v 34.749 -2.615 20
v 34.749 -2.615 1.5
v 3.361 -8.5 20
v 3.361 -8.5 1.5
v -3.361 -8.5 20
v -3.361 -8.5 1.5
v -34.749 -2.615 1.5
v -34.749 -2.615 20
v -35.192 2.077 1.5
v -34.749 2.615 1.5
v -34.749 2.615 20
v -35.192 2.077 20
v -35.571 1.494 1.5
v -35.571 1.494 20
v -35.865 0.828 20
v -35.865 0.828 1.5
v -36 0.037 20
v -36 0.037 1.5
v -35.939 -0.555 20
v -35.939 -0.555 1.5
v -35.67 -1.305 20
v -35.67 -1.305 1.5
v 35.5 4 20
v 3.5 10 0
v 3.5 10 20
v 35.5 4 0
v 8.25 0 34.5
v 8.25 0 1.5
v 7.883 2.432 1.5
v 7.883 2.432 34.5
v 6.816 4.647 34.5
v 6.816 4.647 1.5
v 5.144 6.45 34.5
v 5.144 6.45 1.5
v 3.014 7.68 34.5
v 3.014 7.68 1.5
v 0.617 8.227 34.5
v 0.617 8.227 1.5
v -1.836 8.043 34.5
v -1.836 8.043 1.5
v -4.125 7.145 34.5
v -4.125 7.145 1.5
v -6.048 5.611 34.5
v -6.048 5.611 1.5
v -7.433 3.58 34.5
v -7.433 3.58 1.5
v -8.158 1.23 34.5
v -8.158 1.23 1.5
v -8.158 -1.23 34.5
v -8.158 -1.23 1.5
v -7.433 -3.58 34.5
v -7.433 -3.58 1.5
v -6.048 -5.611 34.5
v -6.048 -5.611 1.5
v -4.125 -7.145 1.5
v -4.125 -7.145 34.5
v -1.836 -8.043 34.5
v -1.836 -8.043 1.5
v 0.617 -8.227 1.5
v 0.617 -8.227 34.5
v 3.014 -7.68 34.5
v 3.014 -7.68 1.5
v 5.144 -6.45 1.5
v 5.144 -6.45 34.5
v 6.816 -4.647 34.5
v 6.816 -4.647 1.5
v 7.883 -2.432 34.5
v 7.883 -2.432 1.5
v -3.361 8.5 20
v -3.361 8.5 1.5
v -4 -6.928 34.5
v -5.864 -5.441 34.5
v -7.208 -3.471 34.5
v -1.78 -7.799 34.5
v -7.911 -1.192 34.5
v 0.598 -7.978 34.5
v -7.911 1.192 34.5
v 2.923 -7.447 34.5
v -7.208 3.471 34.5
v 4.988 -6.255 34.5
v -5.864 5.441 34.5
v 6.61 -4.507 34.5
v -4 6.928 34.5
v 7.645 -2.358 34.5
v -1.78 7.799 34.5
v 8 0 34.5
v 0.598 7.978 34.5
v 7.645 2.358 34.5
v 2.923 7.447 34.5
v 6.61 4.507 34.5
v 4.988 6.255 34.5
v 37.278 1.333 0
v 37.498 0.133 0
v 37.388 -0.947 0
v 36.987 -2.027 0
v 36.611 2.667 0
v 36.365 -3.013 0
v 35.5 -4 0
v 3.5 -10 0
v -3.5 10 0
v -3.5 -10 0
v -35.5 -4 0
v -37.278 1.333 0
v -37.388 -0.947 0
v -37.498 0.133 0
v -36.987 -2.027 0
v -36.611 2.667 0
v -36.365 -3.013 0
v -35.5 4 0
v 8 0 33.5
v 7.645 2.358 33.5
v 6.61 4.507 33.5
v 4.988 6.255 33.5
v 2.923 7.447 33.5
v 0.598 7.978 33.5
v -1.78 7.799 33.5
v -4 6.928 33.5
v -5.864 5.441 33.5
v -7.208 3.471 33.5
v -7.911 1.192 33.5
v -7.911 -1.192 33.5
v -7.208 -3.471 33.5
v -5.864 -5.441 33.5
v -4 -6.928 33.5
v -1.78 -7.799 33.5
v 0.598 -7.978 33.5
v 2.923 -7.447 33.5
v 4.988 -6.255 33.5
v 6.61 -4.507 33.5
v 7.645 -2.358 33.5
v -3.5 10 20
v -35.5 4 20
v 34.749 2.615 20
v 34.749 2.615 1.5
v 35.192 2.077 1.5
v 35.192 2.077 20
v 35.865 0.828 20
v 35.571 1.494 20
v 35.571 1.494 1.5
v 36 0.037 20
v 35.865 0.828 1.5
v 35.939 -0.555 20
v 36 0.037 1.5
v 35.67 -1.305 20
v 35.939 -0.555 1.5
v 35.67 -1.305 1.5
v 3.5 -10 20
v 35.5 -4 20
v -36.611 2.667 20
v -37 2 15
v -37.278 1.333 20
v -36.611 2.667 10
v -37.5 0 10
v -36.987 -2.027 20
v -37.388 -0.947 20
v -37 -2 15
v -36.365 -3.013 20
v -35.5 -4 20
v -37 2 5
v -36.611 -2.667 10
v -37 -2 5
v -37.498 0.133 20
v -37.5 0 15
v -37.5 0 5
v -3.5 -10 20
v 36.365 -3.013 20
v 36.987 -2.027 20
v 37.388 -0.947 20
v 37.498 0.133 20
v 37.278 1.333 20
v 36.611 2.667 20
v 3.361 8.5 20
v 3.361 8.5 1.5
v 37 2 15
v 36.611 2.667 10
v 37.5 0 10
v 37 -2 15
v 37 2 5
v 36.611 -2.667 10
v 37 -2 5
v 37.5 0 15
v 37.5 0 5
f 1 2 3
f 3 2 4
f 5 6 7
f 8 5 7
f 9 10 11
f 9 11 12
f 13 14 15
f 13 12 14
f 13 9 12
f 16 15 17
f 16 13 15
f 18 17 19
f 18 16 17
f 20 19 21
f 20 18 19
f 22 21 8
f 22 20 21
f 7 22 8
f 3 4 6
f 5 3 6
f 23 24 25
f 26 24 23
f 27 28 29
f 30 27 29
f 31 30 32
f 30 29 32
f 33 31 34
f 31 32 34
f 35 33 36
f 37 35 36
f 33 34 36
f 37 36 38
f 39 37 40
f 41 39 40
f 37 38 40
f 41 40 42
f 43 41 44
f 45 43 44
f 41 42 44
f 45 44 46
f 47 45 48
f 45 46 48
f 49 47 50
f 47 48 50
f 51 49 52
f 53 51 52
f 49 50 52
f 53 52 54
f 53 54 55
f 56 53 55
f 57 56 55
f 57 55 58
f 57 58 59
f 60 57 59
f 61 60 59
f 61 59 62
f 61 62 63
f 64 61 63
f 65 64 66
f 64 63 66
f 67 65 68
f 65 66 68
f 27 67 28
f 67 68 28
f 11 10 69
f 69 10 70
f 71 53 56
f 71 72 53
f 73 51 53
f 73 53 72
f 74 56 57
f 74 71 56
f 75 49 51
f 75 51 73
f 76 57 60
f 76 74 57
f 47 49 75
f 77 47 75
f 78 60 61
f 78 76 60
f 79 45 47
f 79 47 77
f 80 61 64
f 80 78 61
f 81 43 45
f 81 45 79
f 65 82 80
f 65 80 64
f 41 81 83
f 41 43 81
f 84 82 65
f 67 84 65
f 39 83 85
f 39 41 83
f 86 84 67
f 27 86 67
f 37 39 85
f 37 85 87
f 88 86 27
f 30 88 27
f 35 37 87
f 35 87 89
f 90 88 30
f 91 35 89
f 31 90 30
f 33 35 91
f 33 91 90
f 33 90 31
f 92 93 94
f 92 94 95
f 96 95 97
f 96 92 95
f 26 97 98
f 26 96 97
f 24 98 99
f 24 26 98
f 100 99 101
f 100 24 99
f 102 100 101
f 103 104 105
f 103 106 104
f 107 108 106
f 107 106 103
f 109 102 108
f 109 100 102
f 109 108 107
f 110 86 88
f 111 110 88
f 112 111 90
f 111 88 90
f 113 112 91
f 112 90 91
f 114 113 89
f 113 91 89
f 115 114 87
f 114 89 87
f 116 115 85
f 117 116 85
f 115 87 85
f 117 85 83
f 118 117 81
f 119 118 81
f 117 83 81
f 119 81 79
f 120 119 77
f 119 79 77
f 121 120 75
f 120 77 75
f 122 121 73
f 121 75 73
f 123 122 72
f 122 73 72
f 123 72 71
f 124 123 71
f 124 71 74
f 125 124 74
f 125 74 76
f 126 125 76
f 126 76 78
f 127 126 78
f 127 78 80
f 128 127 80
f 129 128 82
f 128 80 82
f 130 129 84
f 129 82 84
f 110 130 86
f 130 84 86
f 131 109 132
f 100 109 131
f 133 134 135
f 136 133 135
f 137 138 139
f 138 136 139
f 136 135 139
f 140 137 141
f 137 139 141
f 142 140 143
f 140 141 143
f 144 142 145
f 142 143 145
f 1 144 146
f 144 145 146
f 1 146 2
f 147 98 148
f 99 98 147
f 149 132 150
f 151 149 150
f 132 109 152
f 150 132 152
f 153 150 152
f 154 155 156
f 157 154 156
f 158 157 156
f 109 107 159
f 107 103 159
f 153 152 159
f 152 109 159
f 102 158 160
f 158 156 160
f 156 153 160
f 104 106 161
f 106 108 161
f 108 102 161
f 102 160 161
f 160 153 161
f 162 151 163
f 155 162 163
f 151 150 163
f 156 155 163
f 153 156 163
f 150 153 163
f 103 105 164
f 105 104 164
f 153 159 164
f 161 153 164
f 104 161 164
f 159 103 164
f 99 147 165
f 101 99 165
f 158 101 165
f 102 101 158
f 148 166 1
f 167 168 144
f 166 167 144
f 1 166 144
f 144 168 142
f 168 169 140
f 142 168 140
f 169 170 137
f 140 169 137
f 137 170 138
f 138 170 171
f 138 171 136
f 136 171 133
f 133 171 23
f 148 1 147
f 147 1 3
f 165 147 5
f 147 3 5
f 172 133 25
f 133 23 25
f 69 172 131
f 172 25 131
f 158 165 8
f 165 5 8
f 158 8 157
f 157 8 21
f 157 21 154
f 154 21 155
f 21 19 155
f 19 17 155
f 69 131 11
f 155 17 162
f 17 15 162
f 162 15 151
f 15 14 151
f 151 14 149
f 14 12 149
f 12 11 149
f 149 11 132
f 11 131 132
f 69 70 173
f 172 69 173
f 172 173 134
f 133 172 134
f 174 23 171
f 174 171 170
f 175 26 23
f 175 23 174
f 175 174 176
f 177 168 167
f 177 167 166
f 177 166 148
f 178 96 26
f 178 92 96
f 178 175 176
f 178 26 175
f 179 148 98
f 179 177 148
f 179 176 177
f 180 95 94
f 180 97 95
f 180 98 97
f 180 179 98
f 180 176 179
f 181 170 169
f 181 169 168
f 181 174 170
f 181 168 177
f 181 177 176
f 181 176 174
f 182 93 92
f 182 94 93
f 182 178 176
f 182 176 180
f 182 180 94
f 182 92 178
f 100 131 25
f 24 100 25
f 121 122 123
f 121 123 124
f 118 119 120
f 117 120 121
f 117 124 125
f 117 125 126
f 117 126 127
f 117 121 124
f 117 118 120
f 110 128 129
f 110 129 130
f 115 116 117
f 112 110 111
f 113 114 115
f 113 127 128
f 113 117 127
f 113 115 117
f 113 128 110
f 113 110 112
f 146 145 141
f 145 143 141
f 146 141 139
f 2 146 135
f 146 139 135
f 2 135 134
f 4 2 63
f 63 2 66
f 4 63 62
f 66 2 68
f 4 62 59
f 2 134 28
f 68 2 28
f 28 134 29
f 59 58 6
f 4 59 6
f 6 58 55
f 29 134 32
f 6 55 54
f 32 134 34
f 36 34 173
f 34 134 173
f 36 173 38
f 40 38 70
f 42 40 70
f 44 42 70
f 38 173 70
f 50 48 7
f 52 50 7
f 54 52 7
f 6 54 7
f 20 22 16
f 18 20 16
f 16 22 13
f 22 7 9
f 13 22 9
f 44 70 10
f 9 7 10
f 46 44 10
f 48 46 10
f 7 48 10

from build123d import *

# Parameters (mm, degrees)
BOSS_EXTRUDE1_DEPTH = 20
SHELL2_T            = -1.5
SKETCH4_R           = 8.25
BOSS_EXTRUDE6_DEPTH = 33
SKETCH5_R           = 8
CUT_EXTRUDE1_DEPTH  = 1


with BuildPart() as part:
    # Sketch1 → Boss-Extrude1 (new body)
    with BuildSketch(Plane.XY):
        with BuildLine():
            Line((-35.5, 4), (-3.5, 10))
            Line((-3.5, 10), (3.5, 10))
            Line((3.5, 10), (35.5, 4))
            add(Edge.make_bspline(
                [(35.5, 4), (39.5, 0), (35.5, -4)],
                knots=[0, 0, 0, 1, 1, 1], degree=2))
            Line((35.5, -4), (3.5, -10))
            Line((3.5, -10), (-3.5, -10))
            Line((-3.5, -10), (-35.5, -4))
            add(Edge.make_bspline(
                [(-35.5, 4), (-39.5, 0), (-35.5, -4)],
                knots=[0, 0, 0, 1, 1, 1], degree=2))
        make_face()
    extrude(amount=BOSS_EXTRUDE1_DEPTH)

    # Shell2
    shell2_openings = [part.faces().sort_by_distance(p)[0] for p in [
        (0, 0, 20),
    ]]
    offset(amount=SHELL2_T, openings=shell2_openings, kind=Kind.INTERSECTION)

    # Sketch4 → Boss-Extrude6 (add)
    with BuildSketch(Plane.XY.offset(1.5)):
        Circle(SKETCH4_R)
    extrude(amount=BOSS_EXTRUDE6_DEPTH)

    # Sketch5 → Cut-Extrude1 (cut)
    with BuildSketch(Plane.XY.offset(34.5)):
        Circle(SKETCH5_R)
    extrude(amount=-CUT_EXTRUDE1_DEPTH, mode=Mode.SUBTRACT)


solid = part.part
